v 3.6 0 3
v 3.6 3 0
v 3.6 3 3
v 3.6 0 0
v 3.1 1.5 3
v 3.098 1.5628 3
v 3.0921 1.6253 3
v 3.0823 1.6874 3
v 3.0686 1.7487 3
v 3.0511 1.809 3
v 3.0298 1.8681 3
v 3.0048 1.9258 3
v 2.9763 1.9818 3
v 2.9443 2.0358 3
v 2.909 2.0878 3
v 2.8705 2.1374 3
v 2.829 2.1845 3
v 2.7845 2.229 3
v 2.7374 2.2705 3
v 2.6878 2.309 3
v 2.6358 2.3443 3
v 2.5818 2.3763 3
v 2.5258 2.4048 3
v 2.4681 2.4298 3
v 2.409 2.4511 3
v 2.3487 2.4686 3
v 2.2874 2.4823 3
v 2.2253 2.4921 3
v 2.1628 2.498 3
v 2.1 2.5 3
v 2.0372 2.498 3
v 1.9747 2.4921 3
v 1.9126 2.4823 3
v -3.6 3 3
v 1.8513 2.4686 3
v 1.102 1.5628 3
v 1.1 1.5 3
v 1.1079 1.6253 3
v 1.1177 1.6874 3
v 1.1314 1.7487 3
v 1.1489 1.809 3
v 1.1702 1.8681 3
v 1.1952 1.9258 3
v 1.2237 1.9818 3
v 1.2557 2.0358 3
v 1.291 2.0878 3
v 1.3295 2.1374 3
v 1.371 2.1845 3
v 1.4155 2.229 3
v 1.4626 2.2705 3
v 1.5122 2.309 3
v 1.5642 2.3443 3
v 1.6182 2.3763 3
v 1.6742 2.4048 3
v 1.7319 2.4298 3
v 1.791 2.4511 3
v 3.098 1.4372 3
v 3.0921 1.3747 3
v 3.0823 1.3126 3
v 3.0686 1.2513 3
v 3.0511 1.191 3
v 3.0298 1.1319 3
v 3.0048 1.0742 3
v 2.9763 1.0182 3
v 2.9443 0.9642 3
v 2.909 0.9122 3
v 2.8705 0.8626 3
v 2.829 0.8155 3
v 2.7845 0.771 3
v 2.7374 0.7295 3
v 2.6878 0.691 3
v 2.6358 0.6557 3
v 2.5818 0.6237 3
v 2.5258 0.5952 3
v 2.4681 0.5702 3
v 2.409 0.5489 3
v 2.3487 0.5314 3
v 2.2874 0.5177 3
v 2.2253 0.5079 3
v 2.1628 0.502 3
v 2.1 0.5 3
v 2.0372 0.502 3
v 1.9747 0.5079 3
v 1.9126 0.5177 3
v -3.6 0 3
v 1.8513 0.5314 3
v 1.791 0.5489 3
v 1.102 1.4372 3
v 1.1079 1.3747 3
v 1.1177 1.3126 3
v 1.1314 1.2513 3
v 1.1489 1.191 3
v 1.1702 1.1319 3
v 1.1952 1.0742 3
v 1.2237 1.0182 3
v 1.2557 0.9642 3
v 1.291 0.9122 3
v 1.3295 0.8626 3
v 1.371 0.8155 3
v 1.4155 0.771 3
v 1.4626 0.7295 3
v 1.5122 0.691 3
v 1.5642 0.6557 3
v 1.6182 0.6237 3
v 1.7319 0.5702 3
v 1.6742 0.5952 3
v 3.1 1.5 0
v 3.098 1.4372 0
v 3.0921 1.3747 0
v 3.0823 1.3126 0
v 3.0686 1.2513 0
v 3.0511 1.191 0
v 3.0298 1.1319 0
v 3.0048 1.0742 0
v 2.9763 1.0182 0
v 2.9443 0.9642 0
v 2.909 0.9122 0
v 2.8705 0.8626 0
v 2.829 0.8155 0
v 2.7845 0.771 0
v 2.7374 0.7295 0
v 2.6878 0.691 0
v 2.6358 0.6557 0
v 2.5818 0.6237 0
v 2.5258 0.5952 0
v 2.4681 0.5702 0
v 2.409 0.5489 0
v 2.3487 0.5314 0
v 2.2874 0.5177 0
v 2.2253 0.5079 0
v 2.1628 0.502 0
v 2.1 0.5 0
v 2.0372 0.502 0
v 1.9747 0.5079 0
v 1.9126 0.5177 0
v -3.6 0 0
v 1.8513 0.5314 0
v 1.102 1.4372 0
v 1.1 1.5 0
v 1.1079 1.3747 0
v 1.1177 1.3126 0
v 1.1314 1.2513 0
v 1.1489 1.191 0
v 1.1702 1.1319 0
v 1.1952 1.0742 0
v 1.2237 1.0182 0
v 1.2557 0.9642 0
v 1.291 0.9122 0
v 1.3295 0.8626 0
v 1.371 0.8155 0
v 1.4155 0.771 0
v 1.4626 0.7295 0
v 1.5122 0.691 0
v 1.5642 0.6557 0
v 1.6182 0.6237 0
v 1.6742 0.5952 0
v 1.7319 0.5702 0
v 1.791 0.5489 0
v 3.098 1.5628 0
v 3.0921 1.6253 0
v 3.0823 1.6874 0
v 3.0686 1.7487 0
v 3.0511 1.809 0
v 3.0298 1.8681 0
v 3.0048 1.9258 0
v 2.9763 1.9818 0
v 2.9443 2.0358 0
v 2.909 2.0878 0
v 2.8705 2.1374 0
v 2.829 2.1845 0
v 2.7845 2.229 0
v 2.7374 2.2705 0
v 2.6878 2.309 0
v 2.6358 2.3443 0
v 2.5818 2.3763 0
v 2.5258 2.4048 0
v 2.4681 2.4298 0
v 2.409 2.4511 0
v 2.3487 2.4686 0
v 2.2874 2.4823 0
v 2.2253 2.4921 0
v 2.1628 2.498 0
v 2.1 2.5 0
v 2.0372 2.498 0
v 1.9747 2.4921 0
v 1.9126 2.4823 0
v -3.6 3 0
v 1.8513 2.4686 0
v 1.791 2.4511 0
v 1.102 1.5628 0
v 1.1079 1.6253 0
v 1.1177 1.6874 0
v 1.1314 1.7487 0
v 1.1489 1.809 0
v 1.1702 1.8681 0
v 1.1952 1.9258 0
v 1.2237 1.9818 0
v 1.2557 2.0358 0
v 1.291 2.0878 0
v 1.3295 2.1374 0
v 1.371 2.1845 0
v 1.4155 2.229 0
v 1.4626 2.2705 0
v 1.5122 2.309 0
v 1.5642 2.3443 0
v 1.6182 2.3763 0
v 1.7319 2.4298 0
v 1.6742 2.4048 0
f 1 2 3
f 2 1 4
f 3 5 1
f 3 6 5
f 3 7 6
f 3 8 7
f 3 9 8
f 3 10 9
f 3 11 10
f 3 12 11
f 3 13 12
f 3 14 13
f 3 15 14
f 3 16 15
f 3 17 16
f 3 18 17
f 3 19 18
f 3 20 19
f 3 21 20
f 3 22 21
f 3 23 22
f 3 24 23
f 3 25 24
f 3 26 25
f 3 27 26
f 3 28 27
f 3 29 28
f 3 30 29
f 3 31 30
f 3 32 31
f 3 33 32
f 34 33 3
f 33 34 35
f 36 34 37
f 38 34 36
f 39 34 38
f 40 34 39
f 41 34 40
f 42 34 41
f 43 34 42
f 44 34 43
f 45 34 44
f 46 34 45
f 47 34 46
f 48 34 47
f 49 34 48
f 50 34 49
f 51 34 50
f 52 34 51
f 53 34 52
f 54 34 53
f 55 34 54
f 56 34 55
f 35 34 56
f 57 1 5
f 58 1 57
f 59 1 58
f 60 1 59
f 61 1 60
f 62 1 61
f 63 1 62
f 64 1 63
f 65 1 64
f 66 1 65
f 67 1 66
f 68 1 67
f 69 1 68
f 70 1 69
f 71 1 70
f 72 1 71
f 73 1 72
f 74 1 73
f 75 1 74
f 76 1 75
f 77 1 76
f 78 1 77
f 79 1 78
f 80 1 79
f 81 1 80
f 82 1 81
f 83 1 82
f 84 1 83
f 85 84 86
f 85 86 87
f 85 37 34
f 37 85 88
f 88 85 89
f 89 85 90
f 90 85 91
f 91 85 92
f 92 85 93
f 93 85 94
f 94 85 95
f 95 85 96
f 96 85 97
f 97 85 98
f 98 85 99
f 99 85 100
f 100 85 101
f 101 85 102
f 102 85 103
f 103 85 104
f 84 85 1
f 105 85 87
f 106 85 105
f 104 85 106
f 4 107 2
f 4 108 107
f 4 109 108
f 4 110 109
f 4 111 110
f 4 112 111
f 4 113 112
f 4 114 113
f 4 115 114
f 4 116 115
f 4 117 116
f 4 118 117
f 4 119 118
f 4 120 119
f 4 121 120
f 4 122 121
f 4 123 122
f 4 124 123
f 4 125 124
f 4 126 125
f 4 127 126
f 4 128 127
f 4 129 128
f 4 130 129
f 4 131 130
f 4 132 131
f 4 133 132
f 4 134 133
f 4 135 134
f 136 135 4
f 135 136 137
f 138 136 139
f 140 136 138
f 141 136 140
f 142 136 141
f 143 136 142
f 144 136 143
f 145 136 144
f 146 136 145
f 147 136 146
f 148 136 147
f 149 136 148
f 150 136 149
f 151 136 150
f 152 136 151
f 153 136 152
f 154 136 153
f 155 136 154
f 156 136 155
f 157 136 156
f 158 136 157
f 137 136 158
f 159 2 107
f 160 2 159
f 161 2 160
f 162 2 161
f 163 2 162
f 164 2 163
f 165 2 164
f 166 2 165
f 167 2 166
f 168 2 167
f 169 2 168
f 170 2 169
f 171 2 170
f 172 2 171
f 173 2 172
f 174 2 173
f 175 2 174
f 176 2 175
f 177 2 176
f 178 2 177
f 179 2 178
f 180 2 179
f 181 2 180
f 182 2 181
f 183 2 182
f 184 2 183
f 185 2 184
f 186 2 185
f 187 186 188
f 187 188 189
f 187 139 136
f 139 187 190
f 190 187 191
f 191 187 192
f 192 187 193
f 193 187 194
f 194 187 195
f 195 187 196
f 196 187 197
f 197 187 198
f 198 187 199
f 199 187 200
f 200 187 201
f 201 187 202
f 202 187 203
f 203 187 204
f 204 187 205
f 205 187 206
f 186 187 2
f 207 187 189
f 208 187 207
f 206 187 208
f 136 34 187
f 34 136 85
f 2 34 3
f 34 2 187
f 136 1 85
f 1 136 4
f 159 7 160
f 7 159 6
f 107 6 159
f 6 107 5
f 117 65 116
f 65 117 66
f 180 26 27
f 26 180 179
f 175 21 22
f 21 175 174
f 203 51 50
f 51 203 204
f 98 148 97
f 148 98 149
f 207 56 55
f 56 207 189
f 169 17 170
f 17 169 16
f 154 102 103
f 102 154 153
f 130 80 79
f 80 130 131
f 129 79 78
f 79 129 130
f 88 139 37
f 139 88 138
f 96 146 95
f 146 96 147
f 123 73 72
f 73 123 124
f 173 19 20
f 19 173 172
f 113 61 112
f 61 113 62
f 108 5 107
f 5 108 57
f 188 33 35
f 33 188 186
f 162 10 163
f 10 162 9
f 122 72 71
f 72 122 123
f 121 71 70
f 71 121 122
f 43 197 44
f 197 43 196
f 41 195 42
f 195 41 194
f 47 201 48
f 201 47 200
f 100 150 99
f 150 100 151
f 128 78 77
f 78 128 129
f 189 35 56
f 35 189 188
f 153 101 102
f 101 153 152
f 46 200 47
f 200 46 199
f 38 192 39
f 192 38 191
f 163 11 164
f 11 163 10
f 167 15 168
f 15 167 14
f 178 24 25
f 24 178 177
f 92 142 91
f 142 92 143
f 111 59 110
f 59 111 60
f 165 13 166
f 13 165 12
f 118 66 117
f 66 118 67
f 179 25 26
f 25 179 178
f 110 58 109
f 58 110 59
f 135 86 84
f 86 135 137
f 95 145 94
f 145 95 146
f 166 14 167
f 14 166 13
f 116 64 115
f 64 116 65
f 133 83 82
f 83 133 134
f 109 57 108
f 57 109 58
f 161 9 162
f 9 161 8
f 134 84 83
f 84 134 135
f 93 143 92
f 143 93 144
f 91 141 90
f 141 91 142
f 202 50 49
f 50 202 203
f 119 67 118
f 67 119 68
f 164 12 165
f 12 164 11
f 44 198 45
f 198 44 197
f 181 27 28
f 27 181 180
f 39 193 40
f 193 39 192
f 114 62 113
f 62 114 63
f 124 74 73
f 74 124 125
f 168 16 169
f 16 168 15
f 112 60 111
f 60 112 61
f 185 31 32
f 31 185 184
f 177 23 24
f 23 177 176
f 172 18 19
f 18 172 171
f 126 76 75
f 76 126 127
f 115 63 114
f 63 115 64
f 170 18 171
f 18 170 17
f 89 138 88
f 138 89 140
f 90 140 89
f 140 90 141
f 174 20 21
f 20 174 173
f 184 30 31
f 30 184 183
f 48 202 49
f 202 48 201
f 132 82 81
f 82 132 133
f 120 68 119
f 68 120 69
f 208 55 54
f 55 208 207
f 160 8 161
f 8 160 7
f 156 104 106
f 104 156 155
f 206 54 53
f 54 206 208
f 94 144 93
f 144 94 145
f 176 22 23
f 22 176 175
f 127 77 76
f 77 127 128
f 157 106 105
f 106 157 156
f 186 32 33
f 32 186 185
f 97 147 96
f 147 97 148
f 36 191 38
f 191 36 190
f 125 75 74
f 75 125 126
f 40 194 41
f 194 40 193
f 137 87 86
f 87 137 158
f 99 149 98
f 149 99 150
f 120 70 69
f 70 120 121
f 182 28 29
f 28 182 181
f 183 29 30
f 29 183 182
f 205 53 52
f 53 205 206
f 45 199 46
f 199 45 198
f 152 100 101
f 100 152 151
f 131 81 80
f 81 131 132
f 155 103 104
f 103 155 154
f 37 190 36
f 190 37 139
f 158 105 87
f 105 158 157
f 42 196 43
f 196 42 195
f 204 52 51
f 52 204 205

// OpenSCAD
// $fn = 100;
// translate([-3.6,0,0])
// cube([7.2, 3.0, 3.0]);

// $fn = 100;
// color([0.349, 0.788, 0.647])
// translate([2.1,1.5,0])
//     cylinder(h=3.0,r=1, center=false);


$fn = 100;

difference() {
    // 🔶 Sólido principal: el bloque rectangular
    translate([-3.6, 0, 0])
        cube([7.2, 3.0, 3.0]);

    // 🔷 Sólido a restar: el cilindro
    color([0.349, 0.788, 0.647])  // solo visual
    translate([2.1, 1.5, 0])
        cylinder(h = 3.0, r = 1, center = false);
}
